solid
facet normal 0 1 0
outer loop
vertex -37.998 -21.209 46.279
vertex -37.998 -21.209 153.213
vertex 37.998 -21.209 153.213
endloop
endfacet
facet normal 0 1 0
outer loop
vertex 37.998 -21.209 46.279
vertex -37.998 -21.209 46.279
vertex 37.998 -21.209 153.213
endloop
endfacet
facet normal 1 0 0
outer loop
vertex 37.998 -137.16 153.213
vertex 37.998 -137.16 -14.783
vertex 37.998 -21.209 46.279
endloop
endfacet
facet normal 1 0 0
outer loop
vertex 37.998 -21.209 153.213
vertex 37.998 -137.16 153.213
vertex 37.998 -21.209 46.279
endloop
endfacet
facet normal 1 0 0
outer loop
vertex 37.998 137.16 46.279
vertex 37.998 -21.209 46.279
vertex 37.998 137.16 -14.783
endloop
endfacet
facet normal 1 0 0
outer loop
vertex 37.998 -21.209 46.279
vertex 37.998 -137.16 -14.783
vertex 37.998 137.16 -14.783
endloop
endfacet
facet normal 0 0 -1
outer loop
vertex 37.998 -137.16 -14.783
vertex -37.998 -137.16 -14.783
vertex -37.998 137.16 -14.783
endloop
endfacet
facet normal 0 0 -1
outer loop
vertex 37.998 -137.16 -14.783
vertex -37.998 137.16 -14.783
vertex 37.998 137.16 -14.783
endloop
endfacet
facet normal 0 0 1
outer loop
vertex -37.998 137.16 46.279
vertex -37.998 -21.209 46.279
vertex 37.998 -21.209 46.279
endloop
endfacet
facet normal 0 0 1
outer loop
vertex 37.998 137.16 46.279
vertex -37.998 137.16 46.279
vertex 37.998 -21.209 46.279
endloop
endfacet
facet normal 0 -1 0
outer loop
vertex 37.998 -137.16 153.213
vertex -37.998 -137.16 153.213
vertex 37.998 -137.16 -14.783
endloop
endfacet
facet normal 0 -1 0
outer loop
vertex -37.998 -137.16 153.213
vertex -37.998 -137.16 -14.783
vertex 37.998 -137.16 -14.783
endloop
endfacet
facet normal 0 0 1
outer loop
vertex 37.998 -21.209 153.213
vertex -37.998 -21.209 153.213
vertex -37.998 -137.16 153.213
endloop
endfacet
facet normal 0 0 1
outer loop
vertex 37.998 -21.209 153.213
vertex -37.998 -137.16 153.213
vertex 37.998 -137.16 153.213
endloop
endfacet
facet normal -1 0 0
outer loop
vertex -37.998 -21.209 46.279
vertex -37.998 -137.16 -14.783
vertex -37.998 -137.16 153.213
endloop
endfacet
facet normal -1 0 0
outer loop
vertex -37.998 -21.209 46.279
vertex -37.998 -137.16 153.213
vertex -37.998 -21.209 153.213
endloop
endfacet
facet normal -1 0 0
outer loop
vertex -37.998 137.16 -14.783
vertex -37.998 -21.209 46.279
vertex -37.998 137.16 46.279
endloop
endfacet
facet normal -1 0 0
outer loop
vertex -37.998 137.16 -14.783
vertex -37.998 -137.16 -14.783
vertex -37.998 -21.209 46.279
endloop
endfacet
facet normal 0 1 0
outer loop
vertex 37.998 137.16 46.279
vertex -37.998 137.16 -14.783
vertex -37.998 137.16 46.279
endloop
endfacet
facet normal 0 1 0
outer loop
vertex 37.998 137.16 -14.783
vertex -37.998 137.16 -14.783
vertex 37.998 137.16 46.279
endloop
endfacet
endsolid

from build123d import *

# Parameters (mm, degrees)
F0_W     = 75.9968
F0_H     = 29.5656
F1_DEPTH = 137.16
F2_W     = 75.9968
F2_H     = 115.951
F3_DEPTH = 138.43
F4_W     = 75.9968
F4_H     = 158.369
F5_DEPTH = 31.496


with BuildPart() as f1:
    # F0 (on Front) → F1 (new body, symmetric)
    with BuildSketch(Plane.XZ):
        Rectangle(F0_W, F0_H)
    extrude(amount=F1_DEPTH, both=True)

    # F2 (on face) → F3 (join)
    with BuildSketch(Plane.XY.offset(14.7828)):
        with Locations((0, -79.1845)):
            Rectangle(F2_W, F2_H)
    extrude(amount=F3_DEPTH)

    # F4 (on face) → F5 (join)
    with BuildSketch(Plane.XY.offset(14.7828)):
        with Locations((0, 57.9755)):
            Rectangle(F4_W, F4_H)
    extrude(amount=F5_DEPTH)


solid = f1.part
